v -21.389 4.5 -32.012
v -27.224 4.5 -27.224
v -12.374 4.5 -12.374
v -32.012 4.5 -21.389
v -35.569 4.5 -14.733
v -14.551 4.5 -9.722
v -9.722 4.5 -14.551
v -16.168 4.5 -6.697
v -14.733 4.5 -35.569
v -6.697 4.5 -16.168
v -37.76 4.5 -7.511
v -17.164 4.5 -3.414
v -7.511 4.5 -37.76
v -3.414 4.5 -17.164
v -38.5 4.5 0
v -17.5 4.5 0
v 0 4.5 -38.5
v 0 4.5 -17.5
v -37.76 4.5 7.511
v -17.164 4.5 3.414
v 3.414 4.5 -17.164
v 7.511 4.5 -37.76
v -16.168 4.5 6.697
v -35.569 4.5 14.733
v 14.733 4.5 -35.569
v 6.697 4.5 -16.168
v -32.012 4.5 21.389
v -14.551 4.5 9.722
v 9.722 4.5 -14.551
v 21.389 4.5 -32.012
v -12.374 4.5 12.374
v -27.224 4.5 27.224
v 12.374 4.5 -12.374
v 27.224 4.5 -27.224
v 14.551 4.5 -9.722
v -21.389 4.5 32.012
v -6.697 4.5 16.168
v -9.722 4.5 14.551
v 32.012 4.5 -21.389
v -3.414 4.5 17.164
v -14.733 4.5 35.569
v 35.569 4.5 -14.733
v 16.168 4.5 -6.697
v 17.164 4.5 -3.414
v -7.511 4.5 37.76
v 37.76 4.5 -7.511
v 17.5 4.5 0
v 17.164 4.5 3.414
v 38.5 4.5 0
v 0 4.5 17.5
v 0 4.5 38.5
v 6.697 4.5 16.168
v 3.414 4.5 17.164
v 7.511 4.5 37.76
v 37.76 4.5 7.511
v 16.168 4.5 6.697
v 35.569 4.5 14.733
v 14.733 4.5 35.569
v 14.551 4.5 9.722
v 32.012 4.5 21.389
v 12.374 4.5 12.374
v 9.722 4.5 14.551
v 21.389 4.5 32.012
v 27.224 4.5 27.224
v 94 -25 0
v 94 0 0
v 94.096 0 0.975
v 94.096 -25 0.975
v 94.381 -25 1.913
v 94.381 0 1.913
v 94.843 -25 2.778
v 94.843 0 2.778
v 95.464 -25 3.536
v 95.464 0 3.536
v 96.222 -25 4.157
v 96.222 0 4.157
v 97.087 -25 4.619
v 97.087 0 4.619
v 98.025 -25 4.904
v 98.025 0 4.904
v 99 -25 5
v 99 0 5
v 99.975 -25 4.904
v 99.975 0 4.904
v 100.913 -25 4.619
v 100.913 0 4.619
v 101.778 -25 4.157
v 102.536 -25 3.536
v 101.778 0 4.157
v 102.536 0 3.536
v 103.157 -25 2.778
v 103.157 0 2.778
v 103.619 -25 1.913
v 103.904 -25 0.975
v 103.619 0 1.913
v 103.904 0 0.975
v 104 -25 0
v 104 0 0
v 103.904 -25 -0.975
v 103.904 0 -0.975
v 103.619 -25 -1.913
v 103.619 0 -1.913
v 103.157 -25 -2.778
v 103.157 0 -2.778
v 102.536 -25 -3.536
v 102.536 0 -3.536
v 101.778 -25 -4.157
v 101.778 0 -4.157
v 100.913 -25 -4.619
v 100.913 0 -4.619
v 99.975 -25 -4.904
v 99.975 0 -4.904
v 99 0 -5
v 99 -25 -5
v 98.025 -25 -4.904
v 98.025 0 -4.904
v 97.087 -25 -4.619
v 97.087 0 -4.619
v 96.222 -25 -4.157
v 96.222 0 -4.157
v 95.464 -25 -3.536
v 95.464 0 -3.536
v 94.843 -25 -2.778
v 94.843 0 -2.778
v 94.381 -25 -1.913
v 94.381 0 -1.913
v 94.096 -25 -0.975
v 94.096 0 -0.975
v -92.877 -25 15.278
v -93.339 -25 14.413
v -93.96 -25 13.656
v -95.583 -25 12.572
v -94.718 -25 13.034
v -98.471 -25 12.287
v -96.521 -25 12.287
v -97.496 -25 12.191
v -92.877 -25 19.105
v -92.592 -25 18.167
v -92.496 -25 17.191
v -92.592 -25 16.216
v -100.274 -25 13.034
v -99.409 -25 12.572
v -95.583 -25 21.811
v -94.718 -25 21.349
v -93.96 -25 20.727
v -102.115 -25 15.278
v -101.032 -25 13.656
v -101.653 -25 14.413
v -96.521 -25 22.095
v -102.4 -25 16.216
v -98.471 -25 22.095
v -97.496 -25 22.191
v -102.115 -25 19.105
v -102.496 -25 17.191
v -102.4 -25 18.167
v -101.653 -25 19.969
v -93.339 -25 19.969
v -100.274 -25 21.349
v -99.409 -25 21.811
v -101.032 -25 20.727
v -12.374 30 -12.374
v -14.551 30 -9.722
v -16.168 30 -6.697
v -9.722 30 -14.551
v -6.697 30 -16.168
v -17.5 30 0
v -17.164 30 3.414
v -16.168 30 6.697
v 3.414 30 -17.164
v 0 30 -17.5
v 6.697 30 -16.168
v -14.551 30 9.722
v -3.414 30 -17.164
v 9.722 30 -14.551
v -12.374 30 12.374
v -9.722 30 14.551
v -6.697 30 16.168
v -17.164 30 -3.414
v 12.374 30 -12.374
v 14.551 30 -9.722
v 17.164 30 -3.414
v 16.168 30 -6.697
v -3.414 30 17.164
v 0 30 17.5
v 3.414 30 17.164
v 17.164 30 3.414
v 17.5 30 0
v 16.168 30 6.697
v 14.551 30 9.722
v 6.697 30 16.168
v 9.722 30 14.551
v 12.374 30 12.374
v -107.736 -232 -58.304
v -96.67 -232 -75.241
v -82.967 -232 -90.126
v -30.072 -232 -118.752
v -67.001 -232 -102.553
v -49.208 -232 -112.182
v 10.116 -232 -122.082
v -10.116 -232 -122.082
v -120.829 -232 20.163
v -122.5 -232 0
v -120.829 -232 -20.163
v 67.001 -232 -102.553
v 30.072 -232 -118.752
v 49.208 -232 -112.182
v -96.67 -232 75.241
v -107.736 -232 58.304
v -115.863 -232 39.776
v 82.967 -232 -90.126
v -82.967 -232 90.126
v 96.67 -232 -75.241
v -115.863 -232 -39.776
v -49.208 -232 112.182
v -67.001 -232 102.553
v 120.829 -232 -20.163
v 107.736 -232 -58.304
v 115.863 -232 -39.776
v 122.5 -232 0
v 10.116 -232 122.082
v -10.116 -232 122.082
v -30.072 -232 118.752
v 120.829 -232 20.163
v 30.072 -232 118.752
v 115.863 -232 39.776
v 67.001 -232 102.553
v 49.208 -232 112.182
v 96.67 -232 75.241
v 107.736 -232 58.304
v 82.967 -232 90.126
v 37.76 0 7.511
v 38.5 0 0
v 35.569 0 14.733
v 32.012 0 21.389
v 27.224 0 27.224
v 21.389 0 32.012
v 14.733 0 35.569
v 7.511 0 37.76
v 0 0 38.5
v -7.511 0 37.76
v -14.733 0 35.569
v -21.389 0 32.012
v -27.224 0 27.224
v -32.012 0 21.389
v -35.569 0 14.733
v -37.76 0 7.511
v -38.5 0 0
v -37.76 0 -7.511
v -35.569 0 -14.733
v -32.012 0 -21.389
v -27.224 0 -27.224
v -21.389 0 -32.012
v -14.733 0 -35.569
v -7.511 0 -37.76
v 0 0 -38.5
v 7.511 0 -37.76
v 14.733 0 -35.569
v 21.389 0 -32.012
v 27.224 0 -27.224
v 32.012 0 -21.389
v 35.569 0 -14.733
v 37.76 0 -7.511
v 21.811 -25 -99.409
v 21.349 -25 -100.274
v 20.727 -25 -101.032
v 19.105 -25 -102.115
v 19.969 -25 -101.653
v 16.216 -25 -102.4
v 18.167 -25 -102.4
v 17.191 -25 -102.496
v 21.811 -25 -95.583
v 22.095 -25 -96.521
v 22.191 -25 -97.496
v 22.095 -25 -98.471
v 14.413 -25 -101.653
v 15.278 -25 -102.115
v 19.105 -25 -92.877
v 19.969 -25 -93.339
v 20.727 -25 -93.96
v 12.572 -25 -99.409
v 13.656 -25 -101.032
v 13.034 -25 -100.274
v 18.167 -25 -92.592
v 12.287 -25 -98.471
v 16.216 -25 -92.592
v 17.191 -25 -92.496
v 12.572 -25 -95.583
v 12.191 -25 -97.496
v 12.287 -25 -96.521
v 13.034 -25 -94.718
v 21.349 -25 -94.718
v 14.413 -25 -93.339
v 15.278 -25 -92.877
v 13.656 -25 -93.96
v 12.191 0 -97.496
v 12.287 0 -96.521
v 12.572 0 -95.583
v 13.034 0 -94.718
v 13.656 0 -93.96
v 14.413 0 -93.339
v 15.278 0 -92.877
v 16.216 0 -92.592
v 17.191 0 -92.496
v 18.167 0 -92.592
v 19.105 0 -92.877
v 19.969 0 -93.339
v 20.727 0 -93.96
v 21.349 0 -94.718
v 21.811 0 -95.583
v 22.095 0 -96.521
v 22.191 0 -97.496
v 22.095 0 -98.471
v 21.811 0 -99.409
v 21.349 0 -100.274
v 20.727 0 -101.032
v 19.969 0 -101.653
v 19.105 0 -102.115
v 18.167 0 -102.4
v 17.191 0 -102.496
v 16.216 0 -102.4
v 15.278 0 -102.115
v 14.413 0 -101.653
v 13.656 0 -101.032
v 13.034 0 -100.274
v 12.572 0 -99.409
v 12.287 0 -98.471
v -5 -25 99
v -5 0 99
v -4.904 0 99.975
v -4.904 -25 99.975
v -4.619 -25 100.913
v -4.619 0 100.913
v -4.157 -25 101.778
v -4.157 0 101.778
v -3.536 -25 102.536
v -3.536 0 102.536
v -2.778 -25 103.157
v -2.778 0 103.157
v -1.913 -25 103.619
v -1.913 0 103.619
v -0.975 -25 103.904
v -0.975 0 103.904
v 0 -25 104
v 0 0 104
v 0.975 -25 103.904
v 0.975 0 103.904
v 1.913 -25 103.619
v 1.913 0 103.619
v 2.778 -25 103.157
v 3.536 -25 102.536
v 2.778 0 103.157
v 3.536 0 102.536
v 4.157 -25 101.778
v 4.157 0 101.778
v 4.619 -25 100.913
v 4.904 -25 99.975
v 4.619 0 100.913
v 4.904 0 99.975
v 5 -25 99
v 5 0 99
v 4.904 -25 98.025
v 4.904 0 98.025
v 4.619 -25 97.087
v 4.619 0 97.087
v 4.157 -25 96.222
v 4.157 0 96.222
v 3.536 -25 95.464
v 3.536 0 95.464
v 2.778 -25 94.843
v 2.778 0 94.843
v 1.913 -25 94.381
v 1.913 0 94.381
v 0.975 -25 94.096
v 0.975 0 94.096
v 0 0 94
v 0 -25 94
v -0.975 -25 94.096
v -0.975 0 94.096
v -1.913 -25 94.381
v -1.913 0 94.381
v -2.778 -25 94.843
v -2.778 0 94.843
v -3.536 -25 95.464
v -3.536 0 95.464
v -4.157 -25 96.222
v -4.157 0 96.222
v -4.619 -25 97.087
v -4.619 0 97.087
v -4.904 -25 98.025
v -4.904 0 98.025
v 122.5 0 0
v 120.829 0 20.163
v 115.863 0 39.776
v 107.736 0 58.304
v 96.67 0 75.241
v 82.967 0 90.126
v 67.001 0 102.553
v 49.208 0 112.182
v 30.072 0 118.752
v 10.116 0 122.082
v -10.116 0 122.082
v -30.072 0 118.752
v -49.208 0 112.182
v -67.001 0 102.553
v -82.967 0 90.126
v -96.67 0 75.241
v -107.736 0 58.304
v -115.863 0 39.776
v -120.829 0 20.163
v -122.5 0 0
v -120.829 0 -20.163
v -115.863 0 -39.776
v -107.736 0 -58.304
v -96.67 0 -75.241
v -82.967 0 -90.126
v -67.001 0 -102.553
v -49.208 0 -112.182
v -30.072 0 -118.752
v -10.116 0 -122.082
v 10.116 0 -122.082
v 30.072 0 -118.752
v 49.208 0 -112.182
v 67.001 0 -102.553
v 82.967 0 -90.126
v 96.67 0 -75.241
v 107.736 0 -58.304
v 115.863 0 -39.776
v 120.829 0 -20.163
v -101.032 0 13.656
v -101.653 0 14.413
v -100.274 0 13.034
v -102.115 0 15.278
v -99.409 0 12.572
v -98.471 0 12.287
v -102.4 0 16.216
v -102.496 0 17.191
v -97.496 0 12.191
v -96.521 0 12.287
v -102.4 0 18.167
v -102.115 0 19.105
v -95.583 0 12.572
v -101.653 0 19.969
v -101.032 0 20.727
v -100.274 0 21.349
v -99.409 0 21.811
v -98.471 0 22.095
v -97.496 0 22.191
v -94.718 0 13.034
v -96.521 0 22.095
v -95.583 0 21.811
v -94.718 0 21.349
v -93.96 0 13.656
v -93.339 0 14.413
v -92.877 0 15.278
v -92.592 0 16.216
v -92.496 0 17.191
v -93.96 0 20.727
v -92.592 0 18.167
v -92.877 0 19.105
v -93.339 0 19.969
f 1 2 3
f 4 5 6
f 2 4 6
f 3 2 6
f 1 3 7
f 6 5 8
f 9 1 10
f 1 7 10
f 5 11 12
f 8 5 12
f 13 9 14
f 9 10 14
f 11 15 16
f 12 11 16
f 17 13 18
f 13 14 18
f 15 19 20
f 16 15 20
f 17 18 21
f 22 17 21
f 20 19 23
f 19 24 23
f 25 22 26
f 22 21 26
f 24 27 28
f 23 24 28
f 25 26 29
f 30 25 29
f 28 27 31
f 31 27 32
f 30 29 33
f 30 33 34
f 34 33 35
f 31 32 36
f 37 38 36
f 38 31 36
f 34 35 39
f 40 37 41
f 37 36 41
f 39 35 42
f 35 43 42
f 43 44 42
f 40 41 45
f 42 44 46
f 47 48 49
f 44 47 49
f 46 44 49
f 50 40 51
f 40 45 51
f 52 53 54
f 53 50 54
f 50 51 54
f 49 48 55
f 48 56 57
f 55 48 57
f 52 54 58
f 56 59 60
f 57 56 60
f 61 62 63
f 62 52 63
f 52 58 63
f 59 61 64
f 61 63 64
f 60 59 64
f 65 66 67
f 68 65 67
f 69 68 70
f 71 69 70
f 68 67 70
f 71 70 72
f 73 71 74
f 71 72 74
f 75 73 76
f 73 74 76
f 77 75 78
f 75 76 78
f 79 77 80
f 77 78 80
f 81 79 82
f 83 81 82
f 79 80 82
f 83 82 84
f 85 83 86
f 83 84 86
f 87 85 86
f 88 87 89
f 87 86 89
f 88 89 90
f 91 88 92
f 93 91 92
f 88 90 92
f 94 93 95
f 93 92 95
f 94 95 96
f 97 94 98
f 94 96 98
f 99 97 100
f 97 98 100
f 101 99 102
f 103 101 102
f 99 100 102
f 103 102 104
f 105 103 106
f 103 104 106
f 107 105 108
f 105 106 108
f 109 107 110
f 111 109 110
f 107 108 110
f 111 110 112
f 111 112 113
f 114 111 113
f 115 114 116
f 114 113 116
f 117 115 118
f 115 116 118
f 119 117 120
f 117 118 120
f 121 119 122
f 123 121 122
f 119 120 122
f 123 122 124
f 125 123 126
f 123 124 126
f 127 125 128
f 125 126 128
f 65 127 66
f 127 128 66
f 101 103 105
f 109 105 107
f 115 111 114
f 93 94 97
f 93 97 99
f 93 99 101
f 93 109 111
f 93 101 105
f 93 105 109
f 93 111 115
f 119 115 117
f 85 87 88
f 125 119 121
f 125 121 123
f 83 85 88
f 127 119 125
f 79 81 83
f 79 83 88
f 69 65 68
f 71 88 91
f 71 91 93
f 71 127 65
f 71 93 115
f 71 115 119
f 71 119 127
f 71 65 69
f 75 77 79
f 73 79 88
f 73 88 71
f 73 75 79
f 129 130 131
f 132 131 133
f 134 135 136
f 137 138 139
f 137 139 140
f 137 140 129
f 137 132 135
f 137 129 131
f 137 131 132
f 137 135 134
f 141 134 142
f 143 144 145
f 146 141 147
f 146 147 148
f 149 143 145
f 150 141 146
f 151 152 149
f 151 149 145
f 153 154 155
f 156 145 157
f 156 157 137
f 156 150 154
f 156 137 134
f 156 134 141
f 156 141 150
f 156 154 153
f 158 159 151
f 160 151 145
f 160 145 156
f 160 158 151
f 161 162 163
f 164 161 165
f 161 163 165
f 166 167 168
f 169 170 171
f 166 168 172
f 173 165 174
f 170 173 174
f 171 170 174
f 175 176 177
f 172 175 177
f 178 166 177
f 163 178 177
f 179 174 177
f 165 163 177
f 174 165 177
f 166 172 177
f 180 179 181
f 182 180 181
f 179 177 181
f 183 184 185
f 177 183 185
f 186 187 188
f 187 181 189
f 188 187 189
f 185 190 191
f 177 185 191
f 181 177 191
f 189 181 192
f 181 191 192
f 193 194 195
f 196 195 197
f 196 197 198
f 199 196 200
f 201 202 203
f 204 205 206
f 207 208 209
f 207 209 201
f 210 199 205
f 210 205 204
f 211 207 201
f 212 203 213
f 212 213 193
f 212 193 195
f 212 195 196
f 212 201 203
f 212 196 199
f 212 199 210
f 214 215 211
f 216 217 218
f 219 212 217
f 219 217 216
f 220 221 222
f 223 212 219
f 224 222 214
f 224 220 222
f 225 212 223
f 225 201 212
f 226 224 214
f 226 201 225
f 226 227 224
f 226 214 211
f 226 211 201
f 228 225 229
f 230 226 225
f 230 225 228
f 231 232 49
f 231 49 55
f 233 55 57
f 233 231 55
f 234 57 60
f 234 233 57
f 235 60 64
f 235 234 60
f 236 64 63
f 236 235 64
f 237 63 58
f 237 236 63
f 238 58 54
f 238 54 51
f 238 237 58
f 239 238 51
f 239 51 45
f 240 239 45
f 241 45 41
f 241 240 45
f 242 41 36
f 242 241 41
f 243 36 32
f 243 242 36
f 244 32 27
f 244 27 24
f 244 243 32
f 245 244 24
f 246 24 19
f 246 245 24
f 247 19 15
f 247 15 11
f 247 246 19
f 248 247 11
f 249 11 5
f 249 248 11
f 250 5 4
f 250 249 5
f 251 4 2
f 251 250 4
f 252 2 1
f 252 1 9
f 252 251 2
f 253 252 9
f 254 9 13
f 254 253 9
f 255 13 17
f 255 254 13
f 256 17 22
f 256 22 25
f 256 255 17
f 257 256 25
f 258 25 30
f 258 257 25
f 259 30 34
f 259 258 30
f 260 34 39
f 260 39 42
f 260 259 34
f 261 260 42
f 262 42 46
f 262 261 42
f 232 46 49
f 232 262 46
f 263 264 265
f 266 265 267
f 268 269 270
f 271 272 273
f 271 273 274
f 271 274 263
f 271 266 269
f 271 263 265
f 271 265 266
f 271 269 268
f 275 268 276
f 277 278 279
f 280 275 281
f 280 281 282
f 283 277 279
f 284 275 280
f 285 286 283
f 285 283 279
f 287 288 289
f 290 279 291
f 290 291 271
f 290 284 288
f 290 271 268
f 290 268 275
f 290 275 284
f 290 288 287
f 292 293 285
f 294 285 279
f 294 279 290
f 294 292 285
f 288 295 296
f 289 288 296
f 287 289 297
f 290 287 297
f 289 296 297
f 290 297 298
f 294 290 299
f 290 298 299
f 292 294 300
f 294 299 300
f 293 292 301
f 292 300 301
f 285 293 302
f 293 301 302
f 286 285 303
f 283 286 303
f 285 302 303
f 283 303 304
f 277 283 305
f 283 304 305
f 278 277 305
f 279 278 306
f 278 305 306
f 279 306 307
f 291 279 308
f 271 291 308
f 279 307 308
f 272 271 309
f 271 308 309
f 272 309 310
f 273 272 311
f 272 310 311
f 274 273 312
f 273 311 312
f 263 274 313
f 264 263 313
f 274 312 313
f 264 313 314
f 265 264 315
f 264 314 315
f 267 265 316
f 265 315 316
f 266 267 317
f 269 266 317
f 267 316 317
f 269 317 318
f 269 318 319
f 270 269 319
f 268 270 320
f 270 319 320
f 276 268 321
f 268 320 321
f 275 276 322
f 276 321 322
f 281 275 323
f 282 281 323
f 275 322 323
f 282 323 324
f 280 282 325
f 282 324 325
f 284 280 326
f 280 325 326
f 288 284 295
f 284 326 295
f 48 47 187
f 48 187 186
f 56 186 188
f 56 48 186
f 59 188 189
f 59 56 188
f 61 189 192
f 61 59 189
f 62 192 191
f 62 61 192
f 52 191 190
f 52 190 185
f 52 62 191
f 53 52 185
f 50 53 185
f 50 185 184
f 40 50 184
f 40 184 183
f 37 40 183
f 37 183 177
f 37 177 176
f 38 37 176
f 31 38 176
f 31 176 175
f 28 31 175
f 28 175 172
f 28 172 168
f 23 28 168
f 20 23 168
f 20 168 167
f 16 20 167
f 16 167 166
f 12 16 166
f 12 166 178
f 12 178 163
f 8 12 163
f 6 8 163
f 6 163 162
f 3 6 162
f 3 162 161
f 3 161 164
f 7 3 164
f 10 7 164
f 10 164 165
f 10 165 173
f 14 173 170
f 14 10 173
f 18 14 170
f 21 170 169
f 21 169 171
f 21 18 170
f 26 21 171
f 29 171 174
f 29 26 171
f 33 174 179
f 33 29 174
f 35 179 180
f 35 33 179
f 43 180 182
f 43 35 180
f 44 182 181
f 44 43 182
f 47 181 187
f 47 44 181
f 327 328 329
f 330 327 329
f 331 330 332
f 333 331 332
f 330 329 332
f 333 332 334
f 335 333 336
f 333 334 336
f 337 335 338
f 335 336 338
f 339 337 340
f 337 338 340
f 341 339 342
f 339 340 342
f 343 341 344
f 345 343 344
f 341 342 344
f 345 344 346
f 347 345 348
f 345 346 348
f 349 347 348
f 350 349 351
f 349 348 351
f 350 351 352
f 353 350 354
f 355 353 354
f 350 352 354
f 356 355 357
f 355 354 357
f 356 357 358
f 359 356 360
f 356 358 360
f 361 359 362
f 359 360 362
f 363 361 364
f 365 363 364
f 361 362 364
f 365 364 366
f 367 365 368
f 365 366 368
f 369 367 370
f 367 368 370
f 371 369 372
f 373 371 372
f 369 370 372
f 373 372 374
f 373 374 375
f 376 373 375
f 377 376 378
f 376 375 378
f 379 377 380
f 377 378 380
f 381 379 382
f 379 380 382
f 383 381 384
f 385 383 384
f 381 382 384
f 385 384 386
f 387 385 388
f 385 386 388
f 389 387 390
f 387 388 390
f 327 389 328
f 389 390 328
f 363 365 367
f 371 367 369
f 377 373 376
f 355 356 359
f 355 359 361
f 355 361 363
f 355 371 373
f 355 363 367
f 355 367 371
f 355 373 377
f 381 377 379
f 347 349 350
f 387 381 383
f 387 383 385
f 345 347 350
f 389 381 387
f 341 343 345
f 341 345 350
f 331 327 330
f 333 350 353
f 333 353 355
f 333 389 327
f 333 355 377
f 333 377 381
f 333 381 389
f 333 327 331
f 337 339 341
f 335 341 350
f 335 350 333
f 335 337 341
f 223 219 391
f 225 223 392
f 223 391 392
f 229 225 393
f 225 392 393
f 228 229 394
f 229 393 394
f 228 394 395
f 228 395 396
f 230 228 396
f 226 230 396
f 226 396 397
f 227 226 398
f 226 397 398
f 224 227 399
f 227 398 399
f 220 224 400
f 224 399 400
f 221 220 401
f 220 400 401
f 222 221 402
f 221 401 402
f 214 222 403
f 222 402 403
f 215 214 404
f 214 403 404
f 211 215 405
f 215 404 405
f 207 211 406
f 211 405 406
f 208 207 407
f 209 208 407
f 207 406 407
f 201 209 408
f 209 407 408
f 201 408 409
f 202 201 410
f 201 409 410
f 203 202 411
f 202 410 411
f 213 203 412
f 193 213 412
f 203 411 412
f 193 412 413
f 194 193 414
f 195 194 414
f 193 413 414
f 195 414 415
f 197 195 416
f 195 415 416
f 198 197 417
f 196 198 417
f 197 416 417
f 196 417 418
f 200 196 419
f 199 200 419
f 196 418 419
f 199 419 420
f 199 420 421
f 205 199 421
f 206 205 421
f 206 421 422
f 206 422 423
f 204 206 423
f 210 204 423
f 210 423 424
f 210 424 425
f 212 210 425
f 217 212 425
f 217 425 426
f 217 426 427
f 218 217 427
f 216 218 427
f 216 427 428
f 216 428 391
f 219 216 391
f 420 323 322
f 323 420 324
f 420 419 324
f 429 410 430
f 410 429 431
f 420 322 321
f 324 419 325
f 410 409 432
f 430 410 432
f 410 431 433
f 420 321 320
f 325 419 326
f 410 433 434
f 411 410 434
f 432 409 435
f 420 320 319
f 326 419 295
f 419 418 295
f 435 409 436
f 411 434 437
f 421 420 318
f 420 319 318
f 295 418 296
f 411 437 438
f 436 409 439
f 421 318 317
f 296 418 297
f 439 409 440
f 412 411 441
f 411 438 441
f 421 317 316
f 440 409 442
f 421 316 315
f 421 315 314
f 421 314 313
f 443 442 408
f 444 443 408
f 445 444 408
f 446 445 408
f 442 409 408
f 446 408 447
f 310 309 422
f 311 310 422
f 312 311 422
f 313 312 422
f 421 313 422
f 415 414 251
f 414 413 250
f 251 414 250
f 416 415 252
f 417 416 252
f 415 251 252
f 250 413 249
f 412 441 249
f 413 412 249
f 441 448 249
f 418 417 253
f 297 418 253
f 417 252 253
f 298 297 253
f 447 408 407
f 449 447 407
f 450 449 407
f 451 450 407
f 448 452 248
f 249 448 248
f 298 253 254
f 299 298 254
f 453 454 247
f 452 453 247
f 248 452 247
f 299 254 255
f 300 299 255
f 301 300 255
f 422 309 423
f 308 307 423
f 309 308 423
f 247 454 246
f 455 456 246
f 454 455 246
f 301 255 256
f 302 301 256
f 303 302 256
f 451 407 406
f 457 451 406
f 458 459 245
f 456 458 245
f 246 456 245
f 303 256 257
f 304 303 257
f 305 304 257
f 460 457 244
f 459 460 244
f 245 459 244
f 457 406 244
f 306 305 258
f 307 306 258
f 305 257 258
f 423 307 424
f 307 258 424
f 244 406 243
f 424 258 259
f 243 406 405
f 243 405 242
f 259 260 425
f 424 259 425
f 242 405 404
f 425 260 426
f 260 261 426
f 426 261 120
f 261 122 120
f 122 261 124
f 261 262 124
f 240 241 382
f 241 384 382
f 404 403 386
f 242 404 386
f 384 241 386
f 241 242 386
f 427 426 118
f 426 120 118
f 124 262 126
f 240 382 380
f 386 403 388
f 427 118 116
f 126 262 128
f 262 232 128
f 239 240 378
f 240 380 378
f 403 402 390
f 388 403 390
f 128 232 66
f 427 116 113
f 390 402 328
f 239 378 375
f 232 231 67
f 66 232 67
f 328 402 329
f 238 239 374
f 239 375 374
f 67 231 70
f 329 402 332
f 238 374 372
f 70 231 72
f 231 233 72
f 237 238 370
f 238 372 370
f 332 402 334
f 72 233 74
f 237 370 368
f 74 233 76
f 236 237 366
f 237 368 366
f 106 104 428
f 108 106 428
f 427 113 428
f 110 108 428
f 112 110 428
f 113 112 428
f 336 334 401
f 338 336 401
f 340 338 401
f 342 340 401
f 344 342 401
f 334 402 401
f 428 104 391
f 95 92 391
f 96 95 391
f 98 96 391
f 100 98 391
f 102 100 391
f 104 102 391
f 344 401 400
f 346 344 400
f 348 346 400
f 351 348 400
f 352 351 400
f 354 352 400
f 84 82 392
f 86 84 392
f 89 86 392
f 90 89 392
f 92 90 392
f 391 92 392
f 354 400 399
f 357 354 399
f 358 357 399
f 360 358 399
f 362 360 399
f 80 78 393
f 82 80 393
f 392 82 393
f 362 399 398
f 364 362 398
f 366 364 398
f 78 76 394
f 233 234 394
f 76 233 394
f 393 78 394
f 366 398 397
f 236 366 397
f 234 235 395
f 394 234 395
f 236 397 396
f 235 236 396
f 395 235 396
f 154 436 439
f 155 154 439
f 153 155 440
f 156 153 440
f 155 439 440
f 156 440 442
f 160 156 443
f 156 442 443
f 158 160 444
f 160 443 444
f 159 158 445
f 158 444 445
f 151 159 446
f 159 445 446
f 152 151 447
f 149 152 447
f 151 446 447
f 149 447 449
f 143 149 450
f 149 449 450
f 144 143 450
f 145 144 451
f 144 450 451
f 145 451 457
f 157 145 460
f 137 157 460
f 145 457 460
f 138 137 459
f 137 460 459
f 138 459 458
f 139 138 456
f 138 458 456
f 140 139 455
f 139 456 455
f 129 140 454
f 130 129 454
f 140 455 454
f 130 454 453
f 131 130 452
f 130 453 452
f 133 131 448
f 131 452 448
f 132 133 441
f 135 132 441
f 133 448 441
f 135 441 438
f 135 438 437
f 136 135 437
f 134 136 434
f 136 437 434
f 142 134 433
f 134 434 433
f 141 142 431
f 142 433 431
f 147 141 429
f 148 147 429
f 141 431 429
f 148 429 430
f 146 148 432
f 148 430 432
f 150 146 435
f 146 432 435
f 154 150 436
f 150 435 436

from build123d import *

# Parameters (mm, degrees)
F0_R     = 17.5
F1_DEPTH = 30
F2_R     = 38.5
F3_DEPTH = 4.5
F4_R     = 122.5
F5_DEPTH = 232
F6_R     = 5
F7_DEPTH = 25


with BuildPart() as f1:
    # F0 (on Front) → F1 (new body)
    with BuildSketch(Plane.XZ):
        Circle(F0_R)
    extrude(amount=-F1_DEPTH)

    # F2 (on Front) → F3 (join)
    with BuildSketch(Plane.XZ):
        Circle(F2_R)
    extrude(amount=-F3_DEPTH)

    # F4 (on Front) → F5 (join)
    with BuildSketch(Plane.XZ):
        Circle(F4_R)
    extrude(amount=F5_DEPTH)

    # F6 (on face) → F7 (cut)
    with BuildSketch(Plane(origin=(0, 0, 0), x_dir=(-1, 0, 0), z_dir=(0, 1, 0))):
        with Locations((-99, 0)):
            Circle(F6_R)
        with Locations((0, 99)):
            Circle(F6_R)
        with Locations((97.495968, 17.19117)):
            Circle(F6_R)
        with Locations((-17.19117, -97.495968)):
            Circle(F6_R)
    extrude(amount=-F7_DEPTH, mode=Mode.SUBTRACT)


solid = f1.part
